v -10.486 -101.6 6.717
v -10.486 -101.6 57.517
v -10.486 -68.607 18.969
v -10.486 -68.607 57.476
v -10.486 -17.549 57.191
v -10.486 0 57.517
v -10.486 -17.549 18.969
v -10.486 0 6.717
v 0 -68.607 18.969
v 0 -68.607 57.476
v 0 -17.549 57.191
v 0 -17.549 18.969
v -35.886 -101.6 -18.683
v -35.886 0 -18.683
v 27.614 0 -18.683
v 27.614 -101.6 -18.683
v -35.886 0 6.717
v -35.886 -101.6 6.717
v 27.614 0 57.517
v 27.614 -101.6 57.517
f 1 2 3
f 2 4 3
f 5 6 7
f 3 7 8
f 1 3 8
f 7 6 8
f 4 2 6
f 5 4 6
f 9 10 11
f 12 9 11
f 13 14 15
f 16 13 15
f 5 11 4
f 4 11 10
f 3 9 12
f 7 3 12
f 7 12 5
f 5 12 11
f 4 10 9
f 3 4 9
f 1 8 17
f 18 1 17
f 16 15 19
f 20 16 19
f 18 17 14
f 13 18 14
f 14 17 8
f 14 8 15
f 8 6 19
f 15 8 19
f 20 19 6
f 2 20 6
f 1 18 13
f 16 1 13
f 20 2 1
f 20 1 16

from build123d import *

# Parameters (mm, degrees)
F1_DEPTH = 101.6
F3_DEPTH = 25.4


with BuildPart() as f1:
    # F0 (on Front) → F1 (new body)
    with BuildSketch(Plane.XZ):
        Polygon((-35.885991, 6.716738), (-35.885991, -18.683262), (27.614009, -18.683262), (27.614009, 57.516738), (-10.485991, 57.516738), (-10.485991, 6.716738), align=None)
    extrude(amount=F1_DEPTH)

    # F2 (on Right) → F3 (cut)
    with BuildSketch(Plane.YZ):
        Polygon((-17.54909, 18.968504), (-17.54909, 57.19075), (-68.607166, 57.475988), (-68.607166, 18.968504), align=None)
    extrude(amount=-F3_DEPTH, mode=Mode.SUBTRACT)


solid = f1.part
